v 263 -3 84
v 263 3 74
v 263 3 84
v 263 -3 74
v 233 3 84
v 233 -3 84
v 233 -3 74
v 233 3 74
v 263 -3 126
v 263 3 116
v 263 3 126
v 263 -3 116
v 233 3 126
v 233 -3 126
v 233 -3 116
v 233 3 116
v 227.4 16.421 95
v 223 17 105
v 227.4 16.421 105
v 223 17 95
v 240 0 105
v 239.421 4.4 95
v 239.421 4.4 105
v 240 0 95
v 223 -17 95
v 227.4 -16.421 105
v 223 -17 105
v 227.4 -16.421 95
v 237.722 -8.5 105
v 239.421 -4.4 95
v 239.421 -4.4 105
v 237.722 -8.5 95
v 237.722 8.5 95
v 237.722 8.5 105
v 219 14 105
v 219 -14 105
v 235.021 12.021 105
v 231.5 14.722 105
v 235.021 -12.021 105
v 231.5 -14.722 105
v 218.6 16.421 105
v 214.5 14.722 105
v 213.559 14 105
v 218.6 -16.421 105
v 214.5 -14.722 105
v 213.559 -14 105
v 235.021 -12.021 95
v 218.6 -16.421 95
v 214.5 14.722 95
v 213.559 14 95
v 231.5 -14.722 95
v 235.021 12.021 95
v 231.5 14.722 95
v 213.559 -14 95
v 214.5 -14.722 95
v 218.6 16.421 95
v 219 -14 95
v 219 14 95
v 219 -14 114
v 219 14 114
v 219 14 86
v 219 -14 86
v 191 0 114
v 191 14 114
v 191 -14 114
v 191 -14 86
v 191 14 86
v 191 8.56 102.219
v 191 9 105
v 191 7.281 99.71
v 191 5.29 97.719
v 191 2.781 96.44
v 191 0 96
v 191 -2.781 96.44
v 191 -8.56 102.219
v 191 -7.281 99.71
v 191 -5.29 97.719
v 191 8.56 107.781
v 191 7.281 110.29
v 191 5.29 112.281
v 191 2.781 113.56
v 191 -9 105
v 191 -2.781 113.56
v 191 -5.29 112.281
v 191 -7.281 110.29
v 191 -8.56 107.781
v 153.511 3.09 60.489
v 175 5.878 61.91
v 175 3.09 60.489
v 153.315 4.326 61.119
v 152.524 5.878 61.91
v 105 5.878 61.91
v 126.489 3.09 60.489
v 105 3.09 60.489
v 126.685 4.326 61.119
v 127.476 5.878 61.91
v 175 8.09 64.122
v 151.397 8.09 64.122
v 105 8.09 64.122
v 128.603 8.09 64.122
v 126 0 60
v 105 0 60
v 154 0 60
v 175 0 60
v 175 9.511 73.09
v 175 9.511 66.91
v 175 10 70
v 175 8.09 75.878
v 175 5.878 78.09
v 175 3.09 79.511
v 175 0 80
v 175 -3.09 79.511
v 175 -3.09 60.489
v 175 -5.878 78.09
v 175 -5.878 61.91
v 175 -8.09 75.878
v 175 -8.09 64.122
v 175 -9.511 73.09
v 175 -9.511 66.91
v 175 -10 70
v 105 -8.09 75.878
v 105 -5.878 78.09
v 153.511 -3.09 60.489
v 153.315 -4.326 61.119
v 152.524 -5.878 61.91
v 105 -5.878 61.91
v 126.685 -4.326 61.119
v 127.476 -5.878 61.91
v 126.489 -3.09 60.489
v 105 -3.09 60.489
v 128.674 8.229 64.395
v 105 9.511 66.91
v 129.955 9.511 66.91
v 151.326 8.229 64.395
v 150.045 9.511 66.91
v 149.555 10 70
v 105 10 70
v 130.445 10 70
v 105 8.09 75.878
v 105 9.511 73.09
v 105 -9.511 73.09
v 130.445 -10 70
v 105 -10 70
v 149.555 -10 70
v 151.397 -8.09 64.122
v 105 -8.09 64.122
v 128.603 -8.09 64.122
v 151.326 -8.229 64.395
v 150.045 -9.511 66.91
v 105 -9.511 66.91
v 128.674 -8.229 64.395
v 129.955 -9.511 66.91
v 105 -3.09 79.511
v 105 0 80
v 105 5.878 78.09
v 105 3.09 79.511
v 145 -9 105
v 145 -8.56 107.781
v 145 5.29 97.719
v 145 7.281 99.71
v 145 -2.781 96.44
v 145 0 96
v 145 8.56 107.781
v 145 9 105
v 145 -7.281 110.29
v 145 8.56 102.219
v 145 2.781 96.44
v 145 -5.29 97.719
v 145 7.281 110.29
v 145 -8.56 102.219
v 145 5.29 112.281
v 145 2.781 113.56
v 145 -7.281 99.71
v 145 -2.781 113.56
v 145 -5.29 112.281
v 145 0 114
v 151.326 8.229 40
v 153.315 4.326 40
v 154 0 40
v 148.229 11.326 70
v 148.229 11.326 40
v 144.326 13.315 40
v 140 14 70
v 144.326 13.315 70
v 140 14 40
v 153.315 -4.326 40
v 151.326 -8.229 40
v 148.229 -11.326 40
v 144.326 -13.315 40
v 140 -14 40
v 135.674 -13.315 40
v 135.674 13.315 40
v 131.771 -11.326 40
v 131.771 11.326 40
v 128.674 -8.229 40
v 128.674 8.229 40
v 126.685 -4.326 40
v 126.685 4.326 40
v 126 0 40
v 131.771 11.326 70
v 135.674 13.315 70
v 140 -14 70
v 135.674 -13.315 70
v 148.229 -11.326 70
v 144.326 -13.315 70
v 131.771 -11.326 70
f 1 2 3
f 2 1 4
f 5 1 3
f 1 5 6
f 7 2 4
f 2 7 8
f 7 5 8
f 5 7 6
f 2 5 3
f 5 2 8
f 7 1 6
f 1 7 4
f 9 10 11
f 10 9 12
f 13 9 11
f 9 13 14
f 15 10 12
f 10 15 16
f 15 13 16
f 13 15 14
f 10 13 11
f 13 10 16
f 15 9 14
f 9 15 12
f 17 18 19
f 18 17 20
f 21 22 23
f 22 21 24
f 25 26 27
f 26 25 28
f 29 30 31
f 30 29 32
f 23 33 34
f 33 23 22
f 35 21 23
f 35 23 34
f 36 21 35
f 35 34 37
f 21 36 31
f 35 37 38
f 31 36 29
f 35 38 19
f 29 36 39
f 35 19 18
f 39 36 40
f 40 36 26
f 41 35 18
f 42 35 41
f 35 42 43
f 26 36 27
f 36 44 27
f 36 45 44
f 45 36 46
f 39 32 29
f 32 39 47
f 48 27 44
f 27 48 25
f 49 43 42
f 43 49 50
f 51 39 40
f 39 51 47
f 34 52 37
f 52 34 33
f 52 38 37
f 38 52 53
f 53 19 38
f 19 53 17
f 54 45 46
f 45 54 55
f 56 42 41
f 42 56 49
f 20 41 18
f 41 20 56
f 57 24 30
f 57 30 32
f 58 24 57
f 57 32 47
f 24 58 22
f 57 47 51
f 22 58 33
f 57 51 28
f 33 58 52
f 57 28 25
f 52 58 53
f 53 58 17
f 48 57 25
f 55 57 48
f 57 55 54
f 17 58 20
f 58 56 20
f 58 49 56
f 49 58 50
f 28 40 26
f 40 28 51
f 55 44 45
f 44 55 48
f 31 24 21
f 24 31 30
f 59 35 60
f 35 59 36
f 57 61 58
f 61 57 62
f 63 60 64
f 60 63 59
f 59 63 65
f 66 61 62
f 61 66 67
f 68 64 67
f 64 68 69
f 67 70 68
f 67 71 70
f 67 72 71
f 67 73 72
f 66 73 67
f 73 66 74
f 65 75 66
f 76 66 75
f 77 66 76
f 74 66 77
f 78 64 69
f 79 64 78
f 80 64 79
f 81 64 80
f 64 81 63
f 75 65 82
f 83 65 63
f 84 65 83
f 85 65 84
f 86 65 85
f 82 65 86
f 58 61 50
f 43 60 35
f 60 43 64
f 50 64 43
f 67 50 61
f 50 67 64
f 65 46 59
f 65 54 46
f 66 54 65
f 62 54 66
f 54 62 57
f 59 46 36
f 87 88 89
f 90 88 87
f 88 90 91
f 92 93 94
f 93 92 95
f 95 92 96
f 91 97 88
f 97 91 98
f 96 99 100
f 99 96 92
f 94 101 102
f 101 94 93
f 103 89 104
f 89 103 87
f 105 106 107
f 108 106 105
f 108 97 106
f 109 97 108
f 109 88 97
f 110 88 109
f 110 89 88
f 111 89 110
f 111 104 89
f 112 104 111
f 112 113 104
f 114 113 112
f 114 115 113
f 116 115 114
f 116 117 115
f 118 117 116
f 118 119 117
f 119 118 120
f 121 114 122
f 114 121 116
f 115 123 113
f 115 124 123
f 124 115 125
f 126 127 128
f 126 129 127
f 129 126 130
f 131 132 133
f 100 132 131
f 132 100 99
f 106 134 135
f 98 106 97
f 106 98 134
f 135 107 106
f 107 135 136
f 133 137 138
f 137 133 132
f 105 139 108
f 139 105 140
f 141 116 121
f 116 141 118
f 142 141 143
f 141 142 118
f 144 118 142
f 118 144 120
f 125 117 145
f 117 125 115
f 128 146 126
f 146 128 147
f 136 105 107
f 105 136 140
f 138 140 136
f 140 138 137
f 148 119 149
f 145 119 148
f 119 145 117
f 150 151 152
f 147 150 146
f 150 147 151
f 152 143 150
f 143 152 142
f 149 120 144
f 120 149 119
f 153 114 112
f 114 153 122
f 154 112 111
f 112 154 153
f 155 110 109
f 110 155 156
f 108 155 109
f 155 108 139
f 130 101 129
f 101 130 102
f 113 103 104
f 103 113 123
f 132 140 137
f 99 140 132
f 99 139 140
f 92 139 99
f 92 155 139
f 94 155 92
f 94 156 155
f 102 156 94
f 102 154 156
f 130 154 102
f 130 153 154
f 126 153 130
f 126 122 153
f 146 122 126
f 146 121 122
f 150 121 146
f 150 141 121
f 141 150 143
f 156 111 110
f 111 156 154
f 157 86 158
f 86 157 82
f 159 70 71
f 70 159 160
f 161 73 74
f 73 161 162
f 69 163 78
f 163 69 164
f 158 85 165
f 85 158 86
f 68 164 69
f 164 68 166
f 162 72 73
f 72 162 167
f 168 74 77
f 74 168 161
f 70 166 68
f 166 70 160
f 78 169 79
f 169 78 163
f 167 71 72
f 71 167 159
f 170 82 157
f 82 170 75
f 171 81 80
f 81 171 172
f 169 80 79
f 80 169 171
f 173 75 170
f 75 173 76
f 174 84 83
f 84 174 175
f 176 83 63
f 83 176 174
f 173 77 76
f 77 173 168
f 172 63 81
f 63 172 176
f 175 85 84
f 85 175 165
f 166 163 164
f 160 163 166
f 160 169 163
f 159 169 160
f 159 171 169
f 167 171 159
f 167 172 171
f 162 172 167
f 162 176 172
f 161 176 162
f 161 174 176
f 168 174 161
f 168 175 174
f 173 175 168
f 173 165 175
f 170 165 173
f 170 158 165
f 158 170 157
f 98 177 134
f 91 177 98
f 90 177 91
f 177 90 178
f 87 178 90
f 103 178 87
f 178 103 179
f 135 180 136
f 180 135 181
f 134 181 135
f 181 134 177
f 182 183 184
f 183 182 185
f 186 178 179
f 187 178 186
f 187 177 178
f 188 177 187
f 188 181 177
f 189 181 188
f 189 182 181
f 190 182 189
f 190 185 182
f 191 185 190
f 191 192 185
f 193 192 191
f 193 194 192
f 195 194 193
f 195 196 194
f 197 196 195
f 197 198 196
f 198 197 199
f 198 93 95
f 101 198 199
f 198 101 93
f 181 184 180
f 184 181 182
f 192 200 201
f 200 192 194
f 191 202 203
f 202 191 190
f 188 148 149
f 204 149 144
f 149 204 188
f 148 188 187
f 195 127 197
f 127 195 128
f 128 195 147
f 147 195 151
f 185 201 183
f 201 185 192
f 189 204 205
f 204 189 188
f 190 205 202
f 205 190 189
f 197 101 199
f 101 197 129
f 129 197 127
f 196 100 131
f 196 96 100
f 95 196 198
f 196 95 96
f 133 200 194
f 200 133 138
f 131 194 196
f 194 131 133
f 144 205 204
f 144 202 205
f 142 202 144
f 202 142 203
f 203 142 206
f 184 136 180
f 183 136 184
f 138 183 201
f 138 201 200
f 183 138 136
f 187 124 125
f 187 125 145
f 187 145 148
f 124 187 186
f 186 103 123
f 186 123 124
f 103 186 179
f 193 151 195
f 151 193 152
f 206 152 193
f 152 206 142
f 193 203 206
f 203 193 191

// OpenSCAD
// file: ori_params.scad
// ori_params.scad — Ori Robot Dog master parameters (mirrors Parameters/master_parameters.py)
//
// NOTE: These OpenSCAD files are a parametric, human/AI-READABLE summary of Ori.
// The authoritative, higher-fidelity manufactured geometry is the STEP files in the
// CAD_STEP/ folder of this package (NOT here, but still present). Use those for printing.
//
// All dims in millimetres. These are representative values for a readable/viewable model;
// the Python/CadQuery source (Source/) and STEP exports are the source of truth.

// Robot scale
overall_height = 364;
hip_height     = 300;
ground_clear   = 190;

// Stance
stance_length  = 437;
stance_width   = 168;

// Legs (upper = lower = 175)
link_len = 175;
link_w   = 34;
link_t   = 24;
foot_h   = 40;

// Torso (split at x=0 into two halves)
torso_len = 320;
torso_w   = 150;
torso_h   = 110;

// Head
head_d   = 90;

// Arm (6-DOF), mounted front +X
arm_base_x = 140;
arm_yaw_h  = 30;
arm_upper  = 70;
arm_fore   = 60;
arm_wrist  = 28;
grip_r     = 17;   // coupler radius
finger_len = 30;

// Servo (Hiwonder HTD-45H) envelope
servo_l = 51.1;
servo_w = 20.14;
servo_h = 40;

// Bearing (626ZZ)
bearing_od = 19;
bearing_id = 6;
bearing_w  = 6;
// main file
// ori_arm.scad — 6-DOF front arm + servo-in-wrist passive gear/cam gripper.
// Mirrors CAD/Arm/arm.py. Readable summary, not the manufactured part.
include <ori_params.scad>

module gripper() {
  color("gray") cylinder(r=grip_r, h=10, center=true, $fn=24);   // coupler disc (Ø34)
  // two passive fingers
  for (s=[-1,1])
    translate([grip_r+8, 0, s*(grip_r+4)])
      color("lightgray") cube([finger_len, 6, 10], center=true);
}

module arm() {
  translate([arm_base_x,0,torso_h/2]) {
    color("darkgray") cylinder(r=14,h=arm_yaw_h,center=true,$fn=20);          // yaw
    translate([0,0,arm_yaw_h/2]) {
      rotate([0,90,0]) color("gray") cylinder(r=10,h=arm_upper,center=true,$fn=20); // shoulder->upper
      translate([arm_upper/2,0,arm_upper/2]) rotate([0,90,0])
        color("gray") cylinder(r=9,h=arm_fore,center=true,$fn=20);            // elbow->fore
      translate([arm_upper/2+arm_fore/2,0,arm_fore/2]) {
        color("slategray") cube([arm_wrist,arm_wrist,arm_wrist],center=true); // wrist block
        translate([arm_wrist/2+4,0,0]) gripper();                            // passive tool
      }
    }
  }
}

arm();
